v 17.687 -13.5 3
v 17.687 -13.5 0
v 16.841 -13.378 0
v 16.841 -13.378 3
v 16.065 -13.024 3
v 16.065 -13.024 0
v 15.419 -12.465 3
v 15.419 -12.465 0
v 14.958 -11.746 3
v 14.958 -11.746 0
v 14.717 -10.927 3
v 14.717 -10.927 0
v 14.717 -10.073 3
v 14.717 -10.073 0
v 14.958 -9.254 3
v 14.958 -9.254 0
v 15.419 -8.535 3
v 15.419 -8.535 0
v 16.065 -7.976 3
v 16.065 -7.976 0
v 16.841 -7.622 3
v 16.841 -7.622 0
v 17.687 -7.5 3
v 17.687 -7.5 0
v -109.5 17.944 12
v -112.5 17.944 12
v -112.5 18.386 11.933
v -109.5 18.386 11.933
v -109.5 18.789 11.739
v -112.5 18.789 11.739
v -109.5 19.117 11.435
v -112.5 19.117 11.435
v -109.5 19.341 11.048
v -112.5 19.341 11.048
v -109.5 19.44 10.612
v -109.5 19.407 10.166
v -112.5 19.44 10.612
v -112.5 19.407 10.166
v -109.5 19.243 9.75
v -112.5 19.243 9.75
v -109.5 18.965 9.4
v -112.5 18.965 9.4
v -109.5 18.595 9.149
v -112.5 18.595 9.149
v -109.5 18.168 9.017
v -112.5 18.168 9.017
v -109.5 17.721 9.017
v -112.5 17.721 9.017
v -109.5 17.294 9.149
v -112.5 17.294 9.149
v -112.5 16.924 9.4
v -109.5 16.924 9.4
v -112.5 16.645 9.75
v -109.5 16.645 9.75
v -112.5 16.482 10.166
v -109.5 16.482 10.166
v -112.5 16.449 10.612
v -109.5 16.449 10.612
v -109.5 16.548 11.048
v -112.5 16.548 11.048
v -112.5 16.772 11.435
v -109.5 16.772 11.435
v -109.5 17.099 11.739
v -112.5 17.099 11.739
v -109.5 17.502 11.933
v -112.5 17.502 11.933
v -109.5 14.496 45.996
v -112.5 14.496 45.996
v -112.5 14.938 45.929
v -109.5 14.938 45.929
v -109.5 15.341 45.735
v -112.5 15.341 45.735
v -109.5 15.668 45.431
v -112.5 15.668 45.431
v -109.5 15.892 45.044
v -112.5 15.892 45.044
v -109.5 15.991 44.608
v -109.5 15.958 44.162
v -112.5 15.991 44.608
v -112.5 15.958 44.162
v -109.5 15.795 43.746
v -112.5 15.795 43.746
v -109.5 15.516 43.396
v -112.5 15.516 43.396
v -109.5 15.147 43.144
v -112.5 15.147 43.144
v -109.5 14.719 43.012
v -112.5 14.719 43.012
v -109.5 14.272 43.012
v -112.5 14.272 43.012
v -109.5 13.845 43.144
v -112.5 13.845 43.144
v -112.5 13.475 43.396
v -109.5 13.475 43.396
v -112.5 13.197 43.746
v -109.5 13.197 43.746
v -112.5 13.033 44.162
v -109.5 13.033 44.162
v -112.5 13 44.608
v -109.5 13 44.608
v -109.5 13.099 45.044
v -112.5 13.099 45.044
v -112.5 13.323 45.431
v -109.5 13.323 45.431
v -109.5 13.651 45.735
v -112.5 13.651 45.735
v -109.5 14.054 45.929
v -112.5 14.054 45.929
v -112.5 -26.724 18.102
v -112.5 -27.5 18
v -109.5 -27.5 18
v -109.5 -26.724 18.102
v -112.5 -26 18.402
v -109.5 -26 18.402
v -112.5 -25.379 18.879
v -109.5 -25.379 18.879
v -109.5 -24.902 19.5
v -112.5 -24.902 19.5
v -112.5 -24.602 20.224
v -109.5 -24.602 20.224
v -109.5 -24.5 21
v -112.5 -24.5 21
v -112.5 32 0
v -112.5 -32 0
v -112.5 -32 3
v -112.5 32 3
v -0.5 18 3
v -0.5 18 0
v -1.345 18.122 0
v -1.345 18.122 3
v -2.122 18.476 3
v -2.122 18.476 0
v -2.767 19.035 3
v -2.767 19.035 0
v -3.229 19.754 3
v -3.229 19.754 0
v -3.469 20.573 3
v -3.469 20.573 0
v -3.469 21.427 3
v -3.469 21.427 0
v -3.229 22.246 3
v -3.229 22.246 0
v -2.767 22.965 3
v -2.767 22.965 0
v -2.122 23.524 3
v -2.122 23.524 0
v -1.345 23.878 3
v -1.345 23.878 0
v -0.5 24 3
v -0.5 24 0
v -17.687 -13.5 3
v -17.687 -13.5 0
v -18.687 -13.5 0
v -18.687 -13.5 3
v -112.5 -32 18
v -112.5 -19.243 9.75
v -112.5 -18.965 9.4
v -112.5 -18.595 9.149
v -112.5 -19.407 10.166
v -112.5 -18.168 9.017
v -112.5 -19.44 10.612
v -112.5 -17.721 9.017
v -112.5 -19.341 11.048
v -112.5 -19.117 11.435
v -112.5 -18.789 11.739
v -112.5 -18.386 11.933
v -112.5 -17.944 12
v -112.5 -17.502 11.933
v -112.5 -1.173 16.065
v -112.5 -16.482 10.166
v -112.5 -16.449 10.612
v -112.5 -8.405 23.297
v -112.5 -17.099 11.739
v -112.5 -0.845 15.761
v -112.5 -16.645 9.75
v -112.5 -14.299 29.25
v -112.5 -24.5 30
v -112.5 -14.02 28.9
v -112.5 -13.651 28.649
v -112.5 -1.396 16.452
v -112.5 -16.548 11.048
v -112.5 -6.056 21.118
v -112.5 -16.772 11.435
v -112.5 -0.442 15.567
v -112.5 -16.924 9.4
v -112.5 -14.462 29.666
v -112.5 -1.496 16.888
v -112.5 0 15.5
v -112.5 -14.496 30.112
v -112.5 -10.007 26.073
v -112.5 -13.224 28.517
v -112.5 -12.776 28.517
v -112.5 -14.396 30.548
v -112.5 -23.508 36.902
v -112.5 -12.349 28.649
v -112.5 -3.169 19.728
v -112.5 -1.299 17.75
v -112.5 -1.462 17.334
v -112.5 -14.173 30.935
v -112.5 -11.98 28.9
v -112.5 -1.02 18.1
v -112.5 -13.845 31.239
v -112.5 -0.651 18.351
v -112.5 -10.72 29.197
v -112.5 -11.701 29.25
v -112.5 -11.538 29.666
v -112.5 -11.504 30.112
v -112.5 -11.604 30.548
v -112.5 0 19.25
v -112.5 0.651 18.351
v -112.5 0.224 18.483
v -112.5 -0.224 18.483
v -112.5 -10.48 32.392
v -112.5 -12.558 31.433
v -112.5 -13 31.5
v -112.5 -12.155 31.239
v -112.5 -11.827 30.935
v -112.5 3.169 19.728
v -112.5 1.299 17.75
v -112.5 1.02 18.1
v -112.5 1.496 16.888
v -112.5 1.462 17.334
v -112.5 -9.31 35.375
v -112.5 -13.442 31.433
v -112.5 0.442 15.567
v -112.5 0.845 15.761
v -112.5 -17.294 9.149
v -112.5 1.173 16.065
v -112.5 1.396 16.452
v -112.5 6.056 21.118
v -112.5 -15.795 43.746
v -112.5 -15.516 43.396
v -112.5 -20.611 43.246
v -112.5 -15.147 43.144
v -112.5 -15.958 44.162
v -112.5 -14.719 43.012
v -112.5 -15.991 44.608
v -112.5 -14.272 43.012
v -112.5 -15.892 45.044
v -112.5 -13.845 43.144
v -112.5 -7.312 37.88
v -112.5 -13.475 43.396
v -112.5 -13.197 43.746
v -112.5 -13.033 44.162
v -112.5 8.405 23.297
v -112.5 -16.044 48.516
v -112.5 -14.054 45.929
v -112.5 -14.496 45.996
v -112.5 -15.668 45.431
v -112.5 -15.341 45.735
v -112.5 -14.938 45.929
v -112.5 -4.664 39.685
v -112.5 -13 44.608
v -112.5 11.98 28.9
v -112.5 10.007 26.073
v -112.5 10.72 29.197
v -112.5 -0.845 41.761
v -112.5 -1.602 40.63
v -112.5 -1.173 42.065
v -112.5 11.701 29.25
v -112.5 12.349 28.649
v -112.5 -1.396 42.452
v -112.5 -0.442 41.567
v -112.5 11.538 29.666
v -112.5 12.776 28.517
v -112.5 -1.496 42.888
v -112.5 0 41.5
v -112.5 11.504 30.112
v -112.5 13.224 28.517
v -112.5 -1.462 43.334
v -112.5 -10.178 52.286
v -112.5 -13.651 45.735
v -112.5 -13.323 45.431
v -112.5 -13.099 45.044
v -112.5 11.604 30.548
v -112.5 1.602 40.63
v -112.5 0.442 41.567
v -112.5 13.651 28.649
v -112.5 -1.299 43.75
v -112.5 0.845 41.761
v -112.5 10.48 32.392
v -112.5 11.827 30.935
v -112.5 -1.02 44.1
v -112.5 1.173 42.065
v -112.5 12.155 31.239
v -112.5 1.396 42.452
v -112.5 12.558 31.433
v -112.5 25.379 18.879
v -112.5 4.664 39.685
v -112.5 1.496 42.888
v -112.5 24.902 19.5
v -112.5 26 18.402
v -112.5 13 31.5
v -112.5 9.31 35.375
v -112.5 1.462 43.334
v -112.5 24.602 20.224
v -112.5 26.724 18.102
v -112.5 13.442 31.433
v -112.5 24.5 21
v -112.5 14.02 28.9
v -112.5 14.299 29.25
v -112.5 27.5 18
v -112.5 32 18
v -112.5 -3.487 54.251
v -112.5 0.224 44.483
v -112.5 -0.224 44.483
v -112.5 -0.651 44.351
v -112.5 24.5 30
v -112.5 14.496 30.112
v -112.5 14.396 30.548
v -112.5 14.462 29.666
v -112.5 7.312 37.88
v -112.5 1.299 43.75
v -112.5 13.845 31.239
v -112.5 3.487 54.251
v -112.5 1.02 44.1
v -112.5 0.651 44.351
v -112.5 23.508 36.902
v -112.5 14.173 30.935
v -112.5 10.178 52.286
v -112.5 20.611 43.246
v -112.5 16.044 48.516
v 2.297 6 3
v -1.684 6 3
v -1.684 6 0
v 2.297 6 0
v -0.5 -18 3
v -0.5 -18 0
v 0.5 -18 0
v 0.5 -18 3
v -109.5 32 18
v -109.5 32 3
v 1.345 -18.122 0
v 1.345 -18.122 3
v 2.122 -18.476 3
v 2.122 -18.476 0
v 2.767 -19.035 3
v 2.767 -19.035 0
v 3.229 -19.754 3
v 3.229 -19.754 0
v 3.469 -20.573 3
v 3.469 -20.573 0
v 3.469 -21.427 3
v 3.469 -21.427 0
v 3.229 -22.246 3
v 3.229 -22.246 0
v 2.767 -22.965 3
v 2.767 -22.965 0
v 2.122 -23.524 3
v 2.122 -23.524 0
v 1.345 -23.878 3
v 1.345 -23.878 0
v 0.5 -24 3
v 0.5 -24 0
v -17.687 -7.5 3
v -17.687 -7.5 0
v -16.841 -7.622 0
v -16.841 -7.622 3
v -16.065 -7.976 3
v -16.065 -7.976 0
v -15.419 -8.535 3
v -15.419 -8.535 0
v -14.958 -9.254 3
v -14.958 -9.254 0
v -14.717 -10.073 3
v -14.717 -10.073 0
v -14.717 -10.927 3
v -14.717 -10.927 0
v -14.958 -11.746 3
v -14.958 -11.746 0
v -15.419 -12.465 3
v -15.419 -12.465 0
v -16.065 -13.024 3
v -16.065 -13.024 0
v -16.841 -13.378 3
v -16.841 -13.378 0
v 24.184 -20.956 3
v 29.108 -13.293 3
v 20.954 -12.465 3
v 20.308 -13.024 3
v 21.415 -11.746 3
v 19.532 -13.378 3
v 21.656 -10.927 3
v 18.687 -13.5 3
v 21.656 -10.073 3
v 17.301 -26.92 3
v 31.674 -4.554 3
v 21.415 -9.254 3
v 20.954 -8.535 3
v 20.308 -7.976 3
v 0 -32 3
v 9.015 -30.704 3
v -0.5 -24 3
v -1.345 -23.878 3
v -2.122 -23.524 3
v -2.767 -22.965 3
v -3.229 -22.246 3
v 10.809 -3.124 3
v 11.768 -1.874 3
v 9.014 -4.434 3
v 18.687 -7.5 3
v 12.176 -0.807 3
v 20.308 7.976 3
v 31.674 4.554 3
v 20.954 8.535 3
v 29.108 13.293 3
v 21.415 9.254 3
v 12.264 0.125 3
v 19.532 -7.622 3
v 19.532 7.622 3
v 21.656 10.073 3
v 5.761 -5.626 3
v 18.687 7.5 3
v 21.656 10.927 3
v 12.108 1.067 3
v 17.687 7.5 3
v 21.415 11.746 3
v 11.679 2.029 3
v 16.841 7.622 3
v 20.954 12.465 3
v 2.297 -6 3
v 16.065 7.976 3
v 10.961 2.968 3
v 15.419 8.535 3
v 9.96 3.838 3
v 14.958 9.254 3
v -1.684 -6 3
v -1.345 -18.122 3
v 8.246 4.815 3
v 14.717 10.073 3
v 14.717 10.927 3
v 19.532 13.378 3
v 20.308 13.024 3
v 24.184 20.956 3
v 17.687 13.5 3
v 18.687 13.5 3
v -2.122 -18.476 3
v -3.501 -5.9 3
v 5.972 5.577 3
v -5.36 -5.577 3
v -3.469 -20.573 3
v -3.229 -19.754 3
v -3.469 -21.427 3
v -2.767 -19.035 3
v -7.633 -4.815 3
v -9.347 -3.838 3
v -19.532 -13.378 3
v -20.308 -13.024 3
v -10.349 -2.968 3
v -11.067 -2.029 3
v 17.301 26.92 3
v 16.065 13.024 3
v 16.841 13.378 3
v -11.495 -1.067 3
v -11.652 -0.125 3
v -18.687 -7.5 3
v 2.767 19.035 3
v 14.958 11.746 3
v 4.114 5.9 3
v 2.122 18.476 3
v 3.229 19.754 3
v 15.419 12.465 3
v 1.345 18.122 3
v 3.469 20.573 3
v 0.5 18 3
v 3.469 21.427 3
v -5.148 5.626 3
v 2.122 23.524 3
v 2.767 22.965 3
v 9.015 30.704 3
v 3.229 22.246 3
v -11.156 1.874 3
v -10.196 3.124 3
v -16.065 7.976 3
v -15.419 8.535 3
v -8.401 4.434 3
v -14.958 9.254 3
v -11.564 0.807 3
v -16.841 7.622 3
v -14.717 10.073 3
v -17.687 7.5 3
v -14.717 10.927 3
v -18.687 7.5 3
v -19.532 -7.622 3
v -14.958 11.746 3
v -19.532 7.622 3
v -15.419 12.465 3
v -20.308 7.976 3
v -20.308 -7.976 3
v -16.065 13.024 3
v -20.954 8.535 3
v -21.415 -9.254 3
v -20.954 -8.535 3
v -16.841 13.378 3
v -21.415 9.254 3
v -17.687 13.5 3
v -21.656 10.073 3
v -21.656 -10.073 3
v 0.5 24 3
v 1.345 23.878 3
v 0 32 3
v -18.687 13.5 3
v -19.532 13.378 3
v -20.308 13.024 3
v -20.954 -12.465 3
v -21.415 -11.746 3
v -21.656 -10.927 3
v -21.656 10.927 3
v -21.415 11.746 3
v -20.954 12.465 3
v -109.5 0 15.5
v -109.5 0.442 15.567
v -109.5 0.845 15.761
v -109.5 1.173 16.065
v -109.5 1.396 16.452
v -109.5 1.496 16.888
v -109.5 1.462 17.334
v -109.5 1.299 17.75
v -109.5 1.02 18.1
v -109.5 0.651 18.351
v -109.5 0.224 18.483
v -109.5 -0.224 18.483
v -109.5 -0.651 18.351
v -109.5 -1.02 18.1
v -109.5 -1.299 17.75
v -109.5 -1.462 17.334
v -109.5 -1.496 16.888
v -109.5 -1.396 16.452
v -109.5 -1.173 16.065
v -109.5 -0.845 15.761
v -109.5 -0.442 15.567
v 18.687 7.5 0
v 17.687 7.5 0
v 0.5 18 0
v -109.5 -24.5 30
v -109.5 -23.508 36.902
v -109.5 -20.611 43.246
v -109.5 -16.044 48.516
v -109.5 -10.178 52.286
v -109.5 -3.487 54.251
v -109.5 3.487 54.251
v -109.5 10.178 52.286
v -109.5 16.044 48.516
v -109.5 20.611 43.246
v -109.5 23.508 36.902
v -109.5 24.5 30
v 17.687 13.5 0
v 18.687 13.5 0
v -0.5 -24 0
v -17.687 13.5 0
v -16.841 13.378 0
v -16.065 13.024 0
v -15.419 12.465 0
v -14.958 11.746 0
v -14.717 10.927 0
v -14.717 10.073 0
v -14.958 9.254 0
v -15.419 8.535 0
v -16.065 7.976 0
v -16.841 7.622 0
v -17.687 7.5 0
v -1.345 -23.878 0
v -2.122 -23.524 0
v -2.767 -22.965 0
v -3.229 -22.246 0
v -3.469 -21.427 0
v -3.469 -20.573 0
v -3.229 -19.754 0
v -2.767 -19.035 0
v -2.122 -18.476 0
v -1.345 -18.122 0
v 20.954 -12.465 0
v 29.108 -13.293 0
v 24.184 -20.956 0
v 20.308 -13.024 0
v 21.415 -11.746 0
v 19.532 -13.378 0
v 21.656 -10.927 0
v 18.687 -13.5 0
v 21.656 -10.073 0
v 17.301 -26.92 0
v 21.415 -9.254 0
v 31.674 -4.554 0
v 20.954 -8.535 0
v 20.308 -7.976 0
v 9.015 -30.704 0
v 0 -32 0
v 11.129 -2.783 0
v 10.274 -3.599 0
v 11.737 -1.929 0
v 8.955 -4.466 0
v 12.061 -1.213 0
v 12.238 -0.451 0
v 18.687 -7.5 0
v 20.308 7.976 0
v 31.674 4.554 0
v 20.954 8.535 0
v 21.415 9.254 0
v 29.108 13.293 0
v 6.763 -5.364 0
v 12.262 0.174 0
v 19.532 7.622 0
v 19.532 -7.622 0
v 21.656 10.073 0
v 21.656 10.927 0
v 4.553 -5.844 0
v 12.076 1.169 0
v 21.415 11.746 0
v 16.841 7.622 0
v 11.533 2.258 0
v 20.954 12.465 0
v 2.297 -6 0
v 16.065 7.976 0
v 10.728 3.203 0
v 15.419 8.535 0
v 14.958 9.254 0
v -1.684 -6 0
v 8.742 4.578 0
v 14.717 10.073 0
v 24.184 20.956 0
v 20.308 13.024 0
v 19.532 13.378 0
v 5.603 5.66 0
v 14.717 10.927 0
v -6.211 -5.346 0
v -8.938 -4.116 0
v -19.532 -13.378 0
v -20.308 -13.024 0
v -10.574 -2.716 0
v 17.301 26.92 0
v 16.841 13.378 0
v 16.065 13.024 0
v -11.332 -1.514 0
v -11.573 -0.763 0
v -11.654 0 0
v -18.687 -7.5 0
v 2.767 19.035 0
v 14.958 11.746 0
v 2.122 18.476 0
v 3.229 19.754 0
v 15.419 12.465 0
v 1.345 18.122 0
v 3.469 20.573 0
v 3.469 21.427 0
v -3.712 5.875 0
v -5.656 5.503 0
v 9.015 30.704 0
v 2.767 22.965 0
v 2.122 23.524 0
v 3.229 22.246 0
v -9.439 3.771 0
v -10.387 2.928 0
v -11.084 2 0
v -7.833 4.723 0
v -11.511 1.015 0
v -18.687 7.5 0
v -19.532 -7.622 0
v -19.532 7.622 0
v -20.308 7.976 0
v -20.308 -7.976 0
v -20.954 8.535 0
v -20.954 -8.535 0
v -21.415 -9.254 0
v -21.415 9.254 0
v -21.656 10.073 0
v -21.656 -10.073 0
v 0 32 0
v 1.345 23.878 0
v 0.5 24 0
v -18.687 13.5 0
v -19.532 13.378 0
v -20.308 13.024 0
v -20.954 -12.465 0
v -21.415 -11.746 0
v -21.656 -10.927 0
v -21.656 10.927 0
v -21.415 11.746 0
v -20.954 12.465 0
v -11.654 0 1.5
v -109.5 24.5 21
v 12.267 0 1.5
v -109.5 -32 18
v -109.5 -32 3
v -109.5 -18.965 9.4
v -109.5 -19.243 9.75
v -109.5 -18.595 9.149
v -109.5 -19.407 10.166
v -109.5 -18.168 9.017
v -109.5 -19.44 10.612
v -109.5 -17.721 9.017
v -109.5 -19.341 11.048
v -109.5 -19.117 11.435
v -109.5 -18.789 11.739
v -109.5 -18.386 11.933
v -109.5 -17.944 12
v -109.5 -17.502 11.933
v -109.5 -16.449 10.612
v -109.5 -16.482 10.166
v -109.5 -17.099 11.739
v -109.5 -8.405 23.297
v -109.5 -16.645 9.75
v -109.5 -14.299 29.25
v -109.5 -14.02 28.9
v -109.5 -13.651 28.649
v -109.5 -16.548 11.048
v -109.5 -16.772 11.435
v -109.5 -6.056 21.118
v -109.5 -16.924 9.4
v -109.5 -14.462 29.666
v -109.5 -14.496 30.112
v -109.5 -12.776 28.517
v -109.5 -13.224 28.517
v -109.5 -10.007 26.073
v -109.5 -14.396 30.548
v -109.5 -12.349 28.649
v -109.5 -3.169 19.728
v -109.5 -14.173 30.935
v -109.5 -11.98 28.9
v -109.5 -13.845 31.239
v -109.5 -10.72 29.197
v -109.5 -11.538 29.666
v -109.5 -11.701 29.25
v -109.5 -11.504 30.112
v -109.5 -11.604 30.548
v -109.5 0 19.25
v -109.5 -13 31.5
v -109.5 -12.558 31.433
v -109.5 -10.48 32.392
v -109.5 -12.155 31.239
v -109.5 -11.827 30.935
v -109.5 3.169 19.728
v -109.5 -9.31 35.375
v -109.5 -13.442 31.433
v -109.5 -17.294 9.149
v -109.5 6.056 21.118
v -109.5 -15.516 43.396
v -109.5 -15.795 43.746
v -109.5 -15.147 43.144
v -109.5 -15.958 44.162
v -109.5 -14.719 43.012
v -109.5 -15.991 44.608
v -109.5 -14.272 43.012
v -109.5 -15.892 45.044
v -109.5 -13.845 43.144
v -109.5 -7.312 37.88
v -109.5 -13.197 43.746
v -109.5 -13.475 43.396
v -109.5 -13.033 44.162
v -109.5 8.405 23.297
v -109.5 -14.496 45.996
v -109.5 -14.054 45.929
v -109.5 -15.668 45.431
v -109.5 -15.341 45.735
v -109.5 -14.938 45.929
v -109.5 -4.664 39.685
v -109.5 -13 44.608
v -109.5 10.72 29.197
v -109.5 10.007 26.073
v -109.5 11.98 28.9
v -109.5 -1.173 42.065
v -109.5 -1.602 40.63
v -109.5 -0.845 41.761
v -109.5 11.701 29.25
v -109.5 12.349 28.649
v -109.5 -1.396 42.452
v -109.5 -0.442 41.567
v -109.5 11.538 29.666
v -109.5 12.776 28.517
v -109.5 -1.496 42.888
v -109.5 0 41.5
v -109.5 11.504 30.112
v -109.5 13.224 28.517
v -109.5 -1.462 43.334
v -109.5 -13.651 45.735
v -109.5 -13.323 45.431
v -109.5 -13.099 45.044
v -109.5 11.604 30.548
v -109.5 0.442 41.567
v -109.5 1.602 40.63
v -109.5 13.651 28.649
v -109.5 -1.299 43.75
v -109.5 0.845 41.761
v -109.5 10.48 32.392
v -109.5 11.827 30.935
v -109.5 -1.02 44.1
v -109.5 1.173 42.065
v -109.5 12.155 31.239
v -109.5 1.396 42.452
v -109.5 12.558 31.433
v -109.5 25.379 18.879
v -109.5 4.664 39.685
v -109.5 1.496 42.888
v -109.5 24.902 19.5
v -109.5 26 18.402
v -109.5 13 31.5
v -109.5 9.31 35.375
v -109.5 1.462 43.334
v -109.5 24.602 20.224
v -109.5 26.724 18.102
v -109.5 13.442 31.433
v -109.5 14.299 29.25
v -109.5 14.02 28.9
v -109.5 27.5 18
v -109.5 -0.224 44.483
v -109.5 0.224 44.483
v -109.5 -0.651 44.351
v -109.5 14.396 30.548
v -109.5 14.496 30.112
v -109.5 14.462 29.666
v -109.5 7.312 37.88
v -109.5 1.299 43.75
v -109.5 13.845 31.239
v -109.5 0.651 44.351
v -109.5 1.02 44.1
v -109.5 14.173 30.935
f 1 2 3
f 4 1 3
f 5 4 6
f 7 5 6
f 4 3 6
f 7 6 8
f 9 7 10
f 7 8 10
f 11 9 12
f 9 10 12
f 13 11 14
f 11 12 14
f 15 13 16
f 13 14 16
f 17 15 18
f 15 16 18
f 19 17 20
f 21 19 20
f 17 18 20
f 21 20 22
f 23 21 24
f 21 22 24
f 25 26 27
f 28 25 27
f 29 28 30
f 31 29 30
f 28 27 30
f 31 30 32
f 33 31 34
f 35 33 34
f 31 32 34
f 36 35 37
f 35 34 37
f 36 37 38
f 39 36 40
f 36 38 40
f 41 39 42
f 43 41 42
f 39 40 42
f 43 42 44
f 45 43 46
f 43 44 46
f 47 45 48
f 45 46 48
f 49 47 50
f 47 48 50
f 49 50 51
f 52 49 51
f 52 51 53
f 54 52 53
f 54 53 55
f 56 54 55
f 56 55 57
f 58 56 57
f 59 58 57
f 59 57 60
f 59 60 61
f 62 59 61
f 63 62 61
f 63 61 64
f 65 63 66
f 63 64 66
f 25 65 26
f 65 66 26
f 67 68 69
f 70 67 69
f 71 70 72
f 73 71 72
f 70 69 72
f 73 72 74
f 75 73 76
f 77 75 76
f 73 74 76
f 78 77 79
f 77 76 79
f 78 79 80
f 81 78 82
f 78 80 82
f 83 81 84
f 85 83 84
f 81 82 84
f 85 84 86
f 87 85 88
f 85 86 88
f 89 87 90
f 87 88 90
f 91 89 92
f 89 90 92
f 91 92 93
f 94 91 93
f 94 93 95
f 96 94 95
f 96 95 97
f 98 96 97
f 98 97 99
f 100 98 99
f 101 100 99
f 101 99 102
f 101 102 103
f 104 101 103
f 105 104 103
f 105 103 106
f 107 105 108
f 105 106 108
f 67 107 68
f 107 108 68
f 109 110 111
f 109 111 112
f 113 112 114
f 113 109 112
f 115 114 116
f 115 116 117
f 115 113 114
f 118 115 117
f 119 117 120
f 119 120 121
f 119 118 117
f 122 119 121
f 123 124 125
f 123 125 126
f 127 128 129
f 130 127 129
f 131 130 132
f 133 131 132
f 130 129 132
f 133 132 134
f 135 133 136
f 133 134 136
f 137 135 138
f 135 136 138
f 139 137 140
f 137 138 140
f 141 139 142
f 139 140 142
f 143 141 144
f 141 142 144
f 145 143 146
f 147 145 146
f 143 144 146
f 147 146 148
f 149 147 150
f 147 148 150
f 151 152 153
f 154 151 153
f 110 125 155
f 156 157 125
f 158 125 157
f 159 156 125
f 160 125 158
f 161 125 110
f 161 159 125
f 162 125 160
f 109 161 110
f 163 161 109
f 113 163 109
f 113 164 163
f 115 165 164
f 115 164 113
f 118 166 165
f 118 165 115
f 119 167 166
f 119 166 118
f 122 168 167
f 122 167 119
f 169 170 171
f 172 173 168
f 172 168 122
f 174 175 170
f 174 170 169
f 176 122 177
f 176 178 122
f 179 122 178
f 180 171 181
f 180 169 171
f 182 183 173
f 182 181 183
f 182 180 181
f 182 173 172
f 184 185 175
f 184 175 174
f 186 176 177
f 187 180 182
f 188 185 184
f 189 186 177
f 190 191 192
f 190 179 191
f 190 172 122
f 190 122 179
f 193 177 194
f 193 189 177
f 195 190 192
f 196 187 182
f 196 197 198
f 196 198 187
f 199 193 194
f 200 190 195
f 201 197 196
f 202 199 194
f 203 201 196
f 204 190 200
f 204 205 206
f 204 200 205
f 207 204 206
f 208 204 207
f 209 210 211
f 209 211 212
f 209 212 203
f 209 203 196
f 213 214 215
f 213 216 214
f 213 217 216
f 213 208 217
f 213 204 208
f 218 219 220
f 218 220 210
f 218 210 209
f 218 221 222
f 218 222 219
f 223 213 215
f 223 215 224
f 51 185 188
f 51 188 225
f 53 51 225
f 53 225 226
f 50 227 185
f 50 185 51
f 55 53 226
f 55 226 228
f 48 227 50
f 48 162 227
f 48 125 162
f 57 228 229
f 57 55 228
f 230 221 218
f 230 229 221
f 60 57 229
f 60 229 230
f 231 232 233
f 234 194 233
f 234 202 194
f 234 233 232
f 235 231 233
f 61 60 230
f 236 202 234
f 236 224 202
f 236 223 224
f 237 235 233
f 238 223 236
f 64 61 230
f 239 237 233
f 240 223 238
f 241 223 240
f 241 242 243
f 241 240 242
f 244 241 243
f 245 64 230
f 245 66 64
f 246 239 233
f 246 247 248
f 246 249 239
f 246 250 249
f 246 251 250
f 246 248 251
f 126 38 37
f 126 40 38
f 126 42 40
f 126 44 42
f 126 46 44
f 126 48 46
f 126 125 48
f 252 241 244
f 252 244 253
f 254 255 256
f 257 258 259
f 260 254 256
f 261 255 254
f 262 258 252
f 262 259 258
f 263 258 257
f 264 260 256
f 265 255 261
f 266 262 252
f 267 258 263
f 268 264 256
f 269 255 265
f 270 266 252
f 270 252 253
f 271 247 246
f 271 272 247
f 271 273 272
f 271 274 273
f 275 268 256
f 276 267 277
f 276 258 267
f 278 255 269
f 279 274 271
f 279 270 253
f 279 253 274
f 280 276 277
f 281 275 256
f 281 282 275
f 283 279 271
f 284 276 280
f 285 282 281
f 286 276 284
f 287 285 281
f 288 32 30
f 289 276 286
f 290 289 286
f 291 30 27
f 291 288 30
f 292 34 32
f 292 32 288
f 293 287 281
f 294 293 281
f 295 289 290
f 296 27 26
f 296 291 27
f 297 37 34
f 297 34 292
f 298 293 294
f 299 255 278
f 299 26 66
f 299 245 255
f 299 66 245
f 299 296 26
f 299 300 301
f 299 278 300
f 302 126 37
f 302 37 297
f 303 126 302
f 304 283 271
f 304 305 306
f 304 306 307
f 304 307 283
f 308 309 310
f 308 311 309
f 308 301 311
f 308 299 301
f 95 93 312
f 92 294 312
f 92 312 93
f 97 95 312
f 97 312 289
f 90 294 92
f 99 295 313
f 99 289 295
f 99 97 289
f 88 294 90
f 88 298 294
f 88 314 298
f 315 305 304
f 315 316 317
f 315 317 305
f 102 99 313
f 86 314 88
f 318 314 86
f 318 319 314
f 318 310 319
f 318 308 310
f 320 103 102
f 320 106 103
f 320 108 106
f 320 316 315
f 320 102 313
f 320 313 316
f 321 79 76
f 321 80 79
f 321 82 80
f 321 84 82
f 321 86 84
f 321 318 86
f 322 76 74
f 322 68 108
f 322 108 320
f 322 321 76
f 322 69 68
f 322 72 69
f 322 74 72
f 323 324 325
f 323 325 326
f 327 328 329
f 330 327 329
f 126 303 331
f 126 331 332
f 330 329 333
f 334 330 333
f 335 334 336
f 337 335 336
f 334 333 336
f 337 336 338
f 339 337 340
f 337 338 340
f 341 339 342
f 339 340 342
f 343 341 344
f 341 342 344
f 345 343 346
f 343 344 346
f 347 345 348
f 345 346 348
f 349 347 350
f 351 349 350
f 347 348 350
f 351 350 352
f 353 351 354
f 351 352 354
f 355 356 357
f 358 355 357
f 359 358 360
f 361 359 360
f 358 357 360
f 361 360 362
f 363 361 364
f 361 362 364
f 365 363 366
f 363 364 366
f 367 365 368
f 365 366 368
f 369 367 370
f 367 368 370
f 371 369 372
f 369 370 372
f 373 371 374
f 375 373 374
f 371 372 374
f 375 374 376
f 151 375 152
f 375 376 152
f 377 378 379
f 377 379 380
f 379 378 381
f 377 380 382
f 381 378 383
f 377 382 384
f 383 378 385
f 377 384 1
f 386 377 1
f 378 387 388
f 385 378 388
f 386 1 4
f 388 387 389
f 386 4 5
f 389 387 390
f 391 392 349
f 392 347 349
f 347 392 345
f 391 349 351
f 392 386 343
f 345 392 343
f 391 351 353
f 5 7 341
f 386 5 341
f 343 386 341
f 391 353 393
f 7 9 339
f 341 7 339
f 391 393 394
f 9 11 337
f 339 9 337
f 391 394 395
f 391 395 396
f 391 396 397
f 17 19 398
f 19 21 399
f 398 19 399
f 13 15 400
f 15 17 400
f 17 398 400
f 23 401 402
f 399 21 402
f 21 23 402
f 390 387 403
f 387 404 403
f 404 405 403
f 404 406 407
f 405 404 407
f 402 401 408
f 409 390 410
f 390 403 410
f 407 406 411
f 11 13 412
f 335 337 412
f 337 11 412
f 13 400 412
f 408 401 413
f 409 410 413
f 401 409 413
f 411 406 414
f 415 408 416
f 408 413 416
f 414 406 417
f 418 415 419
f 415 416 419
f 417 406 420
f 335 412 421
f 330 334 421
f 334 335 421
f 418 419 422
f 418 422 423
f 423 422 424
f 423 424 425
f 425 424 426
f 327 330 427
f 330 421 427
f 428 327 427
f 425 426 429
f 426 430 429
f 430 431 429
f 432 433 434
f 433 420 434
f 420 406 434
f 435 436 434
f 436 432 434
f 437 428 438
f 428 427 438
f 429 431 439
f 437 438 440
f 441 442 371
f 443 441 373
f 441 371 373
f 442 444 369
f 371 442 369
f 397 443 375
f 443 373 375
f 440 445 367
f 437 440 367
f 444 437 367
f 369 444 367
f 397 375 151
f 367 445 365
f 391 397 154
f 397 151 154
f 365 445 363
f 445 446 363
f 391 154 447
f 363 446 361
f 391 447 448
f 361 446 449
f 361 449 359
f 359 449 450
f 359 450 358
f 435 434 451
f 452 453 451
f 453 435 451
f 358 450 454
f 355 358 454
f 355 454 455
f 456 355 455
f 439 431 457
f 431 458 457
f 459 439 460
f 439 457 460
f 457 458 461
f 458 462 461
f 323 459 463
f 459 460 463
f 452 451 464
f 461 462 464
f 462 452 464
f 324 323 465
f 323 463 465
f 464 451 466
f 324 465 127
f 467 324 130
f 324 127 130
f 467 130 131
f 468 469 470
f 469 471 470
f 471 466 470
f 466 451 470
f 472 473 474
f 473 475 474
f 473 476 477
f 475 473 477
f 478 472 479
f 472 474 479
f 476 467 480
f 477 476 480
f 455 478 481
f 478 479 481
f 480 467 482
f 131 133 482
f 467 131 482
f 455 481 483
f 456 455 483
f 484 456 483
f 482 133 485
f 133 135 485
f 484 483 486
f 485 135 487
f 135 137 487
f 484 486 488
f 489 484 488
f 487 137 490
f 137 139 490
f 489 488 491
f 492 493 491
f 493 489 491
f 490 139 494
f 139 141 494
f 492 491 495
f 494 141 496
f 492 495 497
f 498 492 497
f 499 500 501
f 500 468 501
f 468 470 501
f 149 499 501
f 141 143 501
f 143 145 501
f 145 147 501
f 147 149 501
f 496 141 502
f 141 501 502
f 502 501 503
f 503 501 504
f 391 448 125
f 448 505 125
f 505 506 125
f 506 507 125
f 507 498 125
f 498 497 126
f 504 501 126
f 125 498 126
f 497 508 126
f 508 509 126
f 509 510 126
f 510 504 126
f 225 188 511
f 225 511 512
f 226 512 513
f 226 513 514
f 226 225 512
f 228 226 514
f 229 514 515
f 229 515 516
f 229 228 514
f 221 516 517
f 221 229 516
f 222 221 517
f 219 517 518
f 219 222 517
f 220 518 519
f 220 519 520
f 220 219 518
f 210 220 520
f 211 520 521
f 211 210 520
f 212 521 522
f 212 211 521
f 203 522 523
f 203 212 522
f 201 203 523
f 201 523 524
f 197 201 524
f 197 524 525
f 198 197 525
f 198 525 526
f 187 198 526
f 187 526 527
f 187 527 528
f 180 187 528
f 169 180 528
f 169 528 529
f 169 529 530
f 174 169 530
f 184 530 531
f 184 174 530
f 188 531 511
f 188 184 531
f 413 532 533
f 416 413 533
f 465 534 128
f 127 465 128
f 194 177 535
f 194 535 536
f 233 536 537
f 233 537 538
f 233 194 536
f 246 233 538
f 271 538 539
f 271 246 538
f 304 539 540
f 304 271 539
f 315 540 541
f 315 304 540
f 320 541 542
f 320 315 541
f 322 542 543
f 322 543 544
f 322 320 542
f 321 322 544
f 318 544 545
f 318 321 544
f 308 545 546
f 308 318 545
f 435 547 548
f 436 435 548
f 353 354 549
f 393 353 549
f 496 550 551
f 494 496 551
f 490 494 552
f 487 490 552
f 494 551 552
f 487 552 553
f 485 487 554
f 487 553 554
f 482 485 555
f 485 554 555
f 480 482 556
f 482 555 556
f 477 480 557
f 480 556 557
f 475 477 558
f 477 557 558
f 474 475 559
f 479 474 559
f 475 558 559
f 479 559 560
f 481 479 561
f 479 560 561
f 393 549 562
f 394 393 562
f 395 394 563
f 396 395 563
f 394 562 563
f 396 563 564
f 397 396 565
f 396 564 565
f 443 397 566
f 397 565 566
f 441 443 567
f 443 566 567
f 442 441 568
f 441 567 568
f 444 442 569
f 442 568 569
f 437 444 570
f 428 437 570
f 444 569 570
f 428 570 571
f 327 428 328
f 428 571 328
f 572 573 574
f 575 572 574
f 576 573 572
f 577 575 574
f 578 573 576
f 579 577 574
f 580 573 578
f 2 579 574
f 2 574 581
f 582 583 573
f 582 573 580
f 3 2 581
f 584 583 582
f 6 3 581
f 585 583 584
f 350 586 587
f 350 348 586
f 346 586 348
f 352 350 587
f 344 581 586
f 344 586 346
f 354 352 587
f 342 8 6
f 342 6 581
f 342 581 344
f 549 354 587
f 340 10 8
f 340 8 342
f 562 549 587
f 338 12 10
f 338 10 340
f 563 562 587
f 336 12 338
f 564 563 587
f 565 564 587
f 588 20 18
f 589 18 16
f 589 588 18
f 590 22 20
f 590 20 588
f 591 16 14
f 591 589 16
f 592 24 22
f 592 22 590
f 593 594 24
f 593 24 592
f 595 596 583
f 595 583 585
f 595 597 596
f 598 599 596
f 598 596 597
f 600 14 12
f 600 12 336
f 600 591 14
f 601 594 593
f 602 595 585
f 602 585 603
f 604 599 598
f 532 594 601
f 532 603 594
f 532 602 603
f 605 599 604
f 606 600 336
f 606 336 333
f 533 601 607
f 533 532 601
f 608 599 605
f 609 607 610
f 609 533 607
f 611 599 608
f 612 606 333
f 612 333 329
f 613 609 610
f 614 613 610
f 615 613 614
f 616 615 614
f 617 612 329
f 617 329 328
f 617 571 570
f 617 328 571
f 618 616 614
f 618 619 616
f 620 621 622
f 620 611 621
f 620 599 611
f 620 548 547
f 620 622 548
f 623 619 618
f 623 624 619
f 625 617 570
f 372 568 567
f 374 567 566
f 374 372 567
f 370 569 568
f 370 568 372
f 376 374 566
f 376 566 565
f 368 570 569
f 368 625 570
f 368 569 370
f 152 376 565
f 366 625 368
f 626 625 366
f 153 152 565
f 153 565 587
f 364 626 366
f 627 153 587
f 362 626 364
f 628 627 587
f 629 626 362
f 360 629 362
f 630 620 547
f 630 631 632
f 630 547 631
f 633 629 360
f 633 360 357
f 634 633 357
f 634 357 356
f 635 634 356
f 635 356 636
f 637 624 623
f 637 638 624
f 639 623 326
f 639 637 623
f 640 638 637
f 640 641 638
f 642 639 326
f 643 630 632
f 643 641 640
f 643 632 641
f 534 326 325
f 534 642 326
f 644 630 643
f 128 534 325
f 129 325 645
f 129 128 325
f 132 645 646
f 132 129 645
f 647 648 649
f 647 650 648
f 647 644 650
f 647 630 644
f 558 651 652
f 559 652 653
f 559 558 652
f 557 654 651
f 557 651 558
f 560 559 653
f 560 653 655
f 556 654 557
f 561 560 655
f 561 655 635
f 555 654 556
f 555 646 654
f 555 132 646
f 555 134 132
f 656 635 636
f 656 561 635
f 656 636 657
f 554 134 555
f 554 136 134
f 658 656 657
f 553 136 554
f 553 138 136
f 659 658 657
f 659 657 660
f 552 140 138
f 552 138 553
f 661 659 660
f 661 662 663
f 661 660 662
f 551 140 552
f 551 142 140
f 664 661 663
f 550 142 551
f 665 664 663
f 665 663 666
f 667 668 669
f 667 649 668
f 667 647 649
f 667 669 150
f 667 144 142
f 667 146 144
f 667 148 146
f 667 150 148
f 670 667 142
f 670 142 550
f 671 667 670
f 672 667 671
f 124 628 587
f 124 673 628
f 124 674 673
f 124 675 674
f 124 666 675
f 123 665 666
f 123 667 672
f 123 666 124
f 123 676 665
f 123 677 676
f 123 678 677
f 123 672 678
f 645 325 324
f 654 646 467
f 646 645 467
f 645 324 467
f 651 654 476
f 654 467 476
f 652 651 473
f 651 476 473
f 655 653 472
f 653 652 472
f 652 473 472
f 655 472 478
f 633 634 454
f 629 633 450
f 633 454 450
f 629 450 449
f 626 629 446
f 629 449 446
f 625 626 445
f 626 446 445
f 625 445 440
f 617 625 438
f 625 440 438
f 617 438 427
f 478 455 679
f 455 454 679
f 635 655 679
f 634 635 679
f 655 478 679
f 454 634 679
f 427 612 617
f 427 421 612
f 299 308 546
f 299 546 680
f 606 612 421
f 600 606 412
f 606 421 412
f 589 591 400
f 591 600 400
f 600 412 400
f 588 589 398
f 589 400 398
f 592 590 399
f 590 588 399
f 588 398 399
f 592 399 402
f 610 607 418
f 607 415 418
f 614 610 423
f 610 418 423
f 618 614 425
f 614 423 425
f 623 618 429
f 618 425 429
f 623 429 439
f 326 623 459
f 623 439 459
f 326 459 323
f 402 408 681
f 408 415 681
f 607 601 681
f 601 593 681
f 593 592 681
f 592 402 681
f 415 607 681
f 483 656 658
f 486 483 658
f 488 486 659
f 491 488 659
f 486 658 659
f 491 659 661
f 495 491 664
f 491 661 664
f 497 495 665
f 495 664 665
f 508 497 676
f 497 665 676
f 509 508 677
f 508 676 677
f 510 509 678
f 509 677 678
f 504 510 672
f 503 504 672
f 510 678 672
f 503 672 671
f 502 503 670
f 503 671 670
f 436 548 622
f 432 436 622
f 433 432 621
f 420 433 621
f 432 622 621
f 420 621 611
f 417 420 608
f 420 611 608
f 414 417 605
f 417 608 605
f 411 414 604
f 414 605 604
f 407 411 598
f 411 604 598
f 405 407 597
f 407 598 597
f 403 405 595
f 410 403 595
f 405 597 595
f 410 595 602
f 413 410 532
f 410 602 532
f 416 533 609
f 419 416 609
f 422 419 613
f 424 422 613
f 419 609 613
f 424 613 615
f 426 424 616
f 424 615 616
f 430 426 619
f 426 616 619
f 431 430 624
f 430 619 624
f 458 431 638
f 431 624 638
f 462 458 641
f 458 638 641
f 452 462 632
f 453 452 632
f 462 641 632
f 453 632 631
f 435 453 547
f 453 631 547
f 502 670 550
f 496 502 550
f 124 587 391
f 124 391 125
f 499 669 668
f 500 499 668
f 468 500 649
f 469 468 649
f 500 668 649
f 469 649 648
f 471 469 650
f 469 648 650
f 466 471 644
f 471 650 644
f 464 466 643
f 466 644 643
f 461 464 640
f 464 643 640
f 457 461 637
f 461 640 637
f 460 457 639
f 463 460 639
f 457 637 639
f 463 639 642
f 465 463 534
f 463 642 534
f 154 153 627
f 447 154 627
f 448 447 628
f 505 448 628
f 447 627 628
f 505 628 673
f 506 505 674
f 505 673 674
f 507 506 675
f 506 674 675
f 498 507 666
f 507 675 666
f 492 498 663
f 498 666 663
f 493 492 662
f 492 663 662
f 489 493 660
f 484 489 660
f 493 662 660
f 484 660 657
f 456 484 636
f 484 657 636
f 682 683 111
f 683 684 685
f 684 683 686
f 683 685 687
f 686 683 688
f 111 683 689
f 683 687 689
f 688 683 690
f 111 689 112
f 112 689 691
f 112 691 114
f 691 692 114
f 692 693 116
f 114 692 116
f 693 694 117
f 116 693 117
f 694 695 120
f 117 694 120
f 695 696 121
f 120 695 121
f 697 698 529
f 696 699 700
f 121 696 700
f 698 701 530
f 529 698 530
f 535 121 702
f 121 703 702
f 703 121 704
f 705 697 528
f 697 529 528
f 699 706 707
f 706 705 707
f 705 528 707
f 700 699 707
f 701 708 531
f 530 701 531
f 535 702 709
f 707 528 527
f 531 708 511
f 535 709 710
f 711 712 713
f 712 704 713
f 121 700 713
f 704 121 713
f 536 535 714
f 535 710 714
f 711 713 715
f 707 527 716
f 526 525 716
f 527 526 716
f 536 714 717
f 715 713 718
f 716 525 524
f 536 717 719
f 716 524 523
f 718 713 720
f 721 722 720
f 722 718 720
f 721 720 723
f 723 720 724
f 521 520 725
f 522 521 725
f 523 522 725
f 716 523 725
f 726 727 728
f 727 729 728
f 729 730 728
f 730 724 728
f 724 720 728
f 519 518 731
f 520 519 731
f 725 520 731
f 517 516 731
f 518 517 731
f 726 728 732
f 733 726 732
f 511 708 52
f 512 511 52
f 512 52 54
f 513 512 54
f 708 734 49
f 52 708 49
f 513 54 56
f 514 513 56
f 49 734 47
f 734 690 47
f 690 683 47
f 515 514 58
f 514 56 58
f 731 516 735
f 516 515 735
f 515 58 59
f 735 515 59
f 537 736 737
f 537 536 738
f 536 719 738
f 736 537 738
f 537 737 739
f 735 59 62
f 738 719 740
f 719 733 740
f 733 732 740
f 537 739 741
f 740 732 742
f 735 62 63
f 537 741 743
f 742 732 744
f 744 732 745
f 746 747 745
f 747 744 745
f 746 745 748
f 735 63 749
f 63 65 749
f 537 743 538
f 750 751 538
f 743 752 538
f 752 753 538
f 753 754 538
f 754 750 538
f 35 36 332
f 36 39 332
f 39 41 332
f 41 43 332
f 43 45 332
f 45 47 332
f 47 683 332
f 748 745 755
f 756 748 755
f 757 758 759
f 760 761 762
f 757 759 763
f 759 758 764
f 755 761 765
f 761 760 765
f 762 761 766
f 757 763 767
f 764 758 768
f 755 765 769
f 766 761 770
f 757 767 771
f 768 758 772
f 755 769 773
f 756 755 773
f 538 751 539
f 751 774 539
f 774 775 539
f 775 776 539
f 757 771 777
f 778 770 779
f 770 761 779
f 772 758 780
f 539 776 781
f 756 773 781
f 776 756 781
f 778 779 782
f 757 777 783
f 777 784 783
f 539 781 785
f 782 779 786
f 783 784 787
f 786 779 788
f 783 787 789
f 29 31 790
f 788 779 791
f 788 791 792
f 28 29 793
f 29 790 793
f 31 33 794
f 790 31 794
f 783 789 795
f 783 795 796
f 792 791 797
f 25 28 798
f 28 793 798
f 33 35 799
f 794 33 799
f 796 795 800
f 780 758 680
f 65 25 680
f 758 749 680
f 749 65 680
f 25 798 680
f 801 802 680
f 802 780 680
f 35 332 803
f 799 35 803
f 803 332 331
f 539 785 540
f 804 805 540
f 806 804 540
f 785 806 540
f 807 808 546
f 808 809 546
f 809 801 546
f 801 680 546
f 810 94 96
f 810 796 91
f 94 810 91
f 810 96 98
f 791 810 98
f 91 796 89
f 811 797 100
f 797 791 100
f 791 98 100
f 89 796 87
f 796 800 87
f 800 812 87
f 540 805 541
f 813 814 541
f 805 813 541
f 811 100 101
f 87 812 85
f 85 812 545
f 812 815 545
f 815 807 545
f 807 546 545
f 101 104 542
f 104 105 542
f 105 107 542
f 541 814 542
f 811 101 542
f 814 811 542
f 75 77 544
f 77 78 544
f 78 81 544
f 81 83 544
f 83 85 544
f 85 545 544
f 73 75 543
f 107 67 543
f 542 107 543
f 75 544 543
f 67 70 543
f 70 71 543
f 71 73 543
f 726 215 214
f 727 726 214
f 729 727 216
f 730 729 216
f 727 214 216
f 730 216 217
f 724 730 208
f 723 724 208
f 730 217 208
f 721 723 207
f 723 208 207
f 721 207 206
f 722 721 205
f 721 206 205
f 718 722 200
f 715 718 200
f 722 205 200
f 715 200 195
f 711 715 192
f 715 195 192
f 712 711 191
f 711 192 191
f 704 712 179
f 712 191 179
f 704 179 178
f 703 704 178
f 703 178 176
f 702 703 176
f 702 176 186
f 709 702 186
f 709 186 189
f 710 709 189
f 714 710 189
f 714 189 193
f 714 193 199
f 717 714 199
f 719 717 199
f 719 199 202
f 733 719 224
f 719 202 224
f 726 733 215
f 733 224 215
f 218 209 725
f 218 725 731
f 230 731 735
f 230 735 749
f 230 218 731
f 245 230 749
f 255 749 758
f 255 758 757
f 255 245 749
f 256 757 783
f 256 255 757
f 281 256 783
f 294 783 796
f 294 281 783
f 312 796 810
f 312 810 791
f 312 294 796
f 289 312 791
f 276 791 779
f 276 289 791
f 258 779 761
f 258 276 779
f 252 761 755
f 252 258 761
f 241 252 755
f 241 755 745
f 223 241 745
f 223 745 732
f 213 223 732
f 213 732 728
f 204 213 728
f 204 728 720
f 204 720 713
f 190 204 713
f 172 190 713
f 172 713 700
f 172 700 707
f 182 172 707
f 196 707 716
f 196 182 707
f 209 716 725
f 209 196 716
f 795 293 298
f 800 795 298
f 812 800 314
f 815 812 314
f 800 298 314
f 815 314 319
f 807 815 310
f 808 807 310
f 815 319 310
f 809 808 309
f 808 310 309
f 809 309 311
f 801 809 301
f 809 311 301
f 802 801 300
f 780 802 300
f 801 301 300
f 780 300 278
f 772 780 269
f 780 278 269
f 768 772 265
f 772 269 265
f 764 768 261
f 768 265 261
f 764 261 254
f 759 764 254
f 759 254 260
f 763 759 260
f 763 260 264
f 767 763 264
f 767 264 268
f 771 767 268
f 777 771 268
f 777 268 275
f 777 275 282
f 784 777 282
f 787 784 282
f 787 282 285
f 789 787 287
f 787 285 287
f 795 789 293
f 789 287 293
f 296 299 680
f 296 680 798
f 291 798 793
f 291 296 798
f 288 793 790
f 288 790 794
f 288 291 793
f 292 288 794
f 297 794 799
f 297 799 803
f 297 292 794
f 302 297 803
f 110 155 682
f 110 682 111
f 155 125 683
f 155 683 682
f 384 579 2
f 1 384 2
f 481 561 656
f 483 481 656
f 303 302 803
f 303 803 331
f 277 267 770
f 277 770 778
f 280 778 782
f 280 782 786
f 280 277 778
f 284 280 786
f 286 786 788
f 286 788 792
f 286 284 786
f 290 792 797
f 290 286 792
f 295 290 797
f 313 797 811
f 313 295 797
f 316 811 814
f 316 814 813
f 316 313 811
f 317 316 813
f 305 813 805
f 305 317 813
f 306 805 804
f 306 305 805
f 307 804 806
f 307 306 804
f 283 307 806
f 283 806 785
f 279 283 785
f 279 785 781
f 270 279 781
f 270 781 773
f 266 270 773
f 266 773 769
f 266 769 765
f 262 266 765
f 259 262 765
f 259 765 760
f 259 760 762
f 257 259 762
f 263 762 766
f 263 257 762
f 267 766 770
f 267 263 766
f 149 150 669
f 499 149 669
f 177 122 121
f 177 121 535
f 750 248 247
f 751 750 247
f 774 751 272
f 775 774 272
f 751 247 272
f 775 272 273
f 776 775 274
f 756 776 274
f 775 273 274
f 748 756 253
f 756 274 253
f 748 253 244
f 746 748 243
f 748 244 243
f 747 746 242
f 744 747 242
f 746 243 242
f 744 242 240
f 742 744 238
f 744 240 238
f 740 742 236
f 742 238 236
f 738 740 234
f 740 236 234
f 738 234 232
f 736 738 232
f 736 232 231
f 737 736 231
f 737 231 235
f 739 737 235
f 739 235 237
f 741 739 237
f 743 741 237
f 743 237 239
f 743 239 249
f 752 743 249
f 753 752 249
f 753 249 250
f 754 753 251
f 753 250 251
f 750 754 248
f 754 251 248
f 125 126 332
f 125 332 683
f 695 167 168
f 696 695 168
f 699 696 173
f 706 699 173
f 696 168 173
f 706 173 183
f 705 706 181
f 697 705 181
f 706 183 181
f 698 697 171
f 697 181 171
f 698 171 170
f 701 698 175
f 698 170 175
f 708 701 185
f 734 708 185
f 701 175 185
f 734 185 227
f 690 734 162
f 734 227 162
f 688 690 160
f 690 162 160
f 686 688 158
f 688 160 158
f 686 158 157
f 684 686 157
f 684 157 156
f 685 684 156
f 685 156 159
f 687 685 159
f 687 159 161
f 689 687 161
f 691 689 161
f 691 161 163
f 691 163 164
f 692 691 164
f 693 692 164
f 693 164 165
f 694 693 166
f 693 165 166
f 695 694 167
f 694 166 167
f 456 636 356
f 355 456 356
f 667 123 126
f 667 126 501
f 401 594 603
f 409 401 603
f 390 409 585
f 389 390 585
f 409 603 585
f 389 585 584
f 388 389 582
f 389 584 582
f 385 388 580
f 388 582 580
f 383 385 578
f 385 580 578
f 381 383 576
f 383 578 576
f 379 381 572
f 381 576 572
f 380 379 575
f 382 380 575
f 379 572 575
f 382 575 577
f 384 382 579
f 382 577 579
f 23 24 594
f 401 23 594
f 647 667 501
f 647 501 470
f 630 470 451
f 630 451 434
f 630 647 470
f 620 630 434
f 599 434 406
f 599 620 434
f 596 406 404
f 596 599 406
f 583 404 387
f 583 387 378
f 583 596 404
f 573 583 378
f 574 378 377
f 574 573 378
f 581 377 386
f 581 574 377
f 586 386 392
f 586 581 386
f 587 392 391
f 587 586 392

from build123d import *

# Parameters (mm, degrees)
BOSS_EXTRUDE1_DEPTH = 3
SKETCH2_R           = 1.5
BOSS_EXTRUDE2_DEPTH = 3
SKETCH3_R           = 6
CUT_EXTRUDE1_DEPTH  = 150.495916109
CUT_EXTRUDE2_DEPTH  = 128.79866979


with BuildPart() as part:
    # Sketch1 → Boss-Extrude1 (new body)
    with BuildSketch(Plane.XY):
        with BuildLine():
            Line((-112.5, 32), (0, 32))
            ThreePointArc((0, 32), (32, 0), (0, -32))
            Line((0, -32), (-112.5, -32))
            Line((-112.5, -32), (-112.5, 32))
        make_face()
        with BuildLine():
            Line((17.686533479, 13.5), (18.686533479, 13.5))
            ThreePointArc((18.686533479, 13.5), (21.686533479, 10.5), (18.686533479, 7.5))
            Line((18.686533479, 7.5), (17.686533479, 7.5))
            ThreePointArc((17.686533479, 7.5), (14.686533479, 10.5), (17.686533479, 13.5))
        make_face(mode=Mode.SUBTRACT)
        with BuildLine():
            Line((17.686533479, -7.5), (18.686533479, -7.5))
            ThreePointArc((18.686533479, -7.5), (21.686533479, -10.5), (18.686533479, -13.5))
            Line((18.686533479, -13.5), (17.686533479, -13.5))
            ThreePointArc((17.686533479, -13.5), (14.686533479, -10.5), (17.686533479, -7.5))
        make_face(mode=Mode.SUBTRACT)
        with BuildLine():
            Line((-0.5, -18), (0.5, -18))
            ThreePointArc((0.5, -18), (3.5, -21), (0.5, -24))
            Line((0.5, -24), (-0.5, -24))
            ThreePointArc((-0.5, -24), (-3.5, -21), (-0.5, -18))
        make_face(mode=Mode.SUBTRACT)
        with BuildLine():
            Line((-18.686533479, -7.5), (-17.686533479, -7.5))
            ThreePointArc((-17.686533479, -7.5), (-14.686533479, -10.5), (-17.686533479, -13.5))
            Line((-17.686533479, -13.5), (-18.686533479, -13.5))
            ThreePointArc((-18.686533479, -13.5), (-21.686533479, -10.5), (-18.686533479, -7.5))
        make_face(mode=Mode.SUBTRACT)
        with BuildLine():
            Line((-17.686533479, 7.5), (-18.686533479, 7.5))
            ThreePointArc((-18.686533479, 7.5), (-21.686533479, 10.5), (-18.686533479, 13.5))
            Line((-18.686533479, 13.5), (-17.686533479, 13.5))
            ThreePointArc((-17.686533479, 13.5), (-14.686533479, 10.5), (-17.686533479, 7.5))
        make_face(mode=Mode.SUBTRACT)
        with BuildLine():
            Line((0.5, 18), (-0.5, 18))
            ThreePointArc((-0.5, 18), (-3.5, 21), (-0.5, 24))
            Line((-0.5, 24), (0.5, 24))
            ThreePointArc((0.5, 24), (3.5, 21), (0.5, 18))
        make_face(mode=Mode.SUBTRACT)
    extrude(amount=BOSS_EXTRUDE1_DEPTH)

    # Sketch3 → Cut-Extrude1 (cut, through all)
    with BuildSketch(Plane(origin=(-68.399252687, 0, -51.542533886), x_dir=(0, 1, 0), z_dir=(0.798635510047294, 0, 0.6018150231520466))):
        with Locations(Location((0, 1.0136449, 0), (0, 0, 90))):
            Circle(SKETCH3_R)
    extrude(amount=CUT_EXTRUDE1_DEPTH, mode=Mode.SUBTRACT)

    # Sketch4 → Cut-Extrude2 (cut, through all)
    with BuildSketch(Plane.XY.offset(3)):
        with BuildLine():
            Line((2.296821411, -6), (-1.684313054, -6))
            add(Edge.make_bspline(
                [(-1.684313054, 6), (-11.654153901, 6), (-11.654153901, 0), (-11.654153901, -6), (-1.684313054, -6)],
                knots=[4.71238898, 4.71238898, 4.71238898, 6.283185307, 6.283185307, 7.853981634, 7.853981634, 7.853981634], degree=2, weights=[1, 0.707106781, 1, 0.707106781, 1]))
            Line((-1.684313054, 6), (2.296821411, 6))
            add(Edge.make_bspline(
                [(2.296821411, -6), (12.266662258, -6), (12.266662258, 0), (12.266662258, 6), (2.296821411, 6)],
                knots=[4.71238898, 4.71238898, 4.71238898, 6.283185307, 6.283185307, 7.853981634, 7.853981634, 7.853981634], degree=2, weights=[1, 0.707106781, 1, 0.707106781, 1]))
        make_face()
    extrude(amount=-CUT_EXTRUDE2_DEPTH, mode=Mode.SUBTRACT)


with BuildPart() as body_2:
    # Sketch2 → Boss-Extrude2 (new body)
    # profile 1 of 2: a face of its own
    with BuildSketch(Plane.ZY.offset(112.5)):
        with BuildLine():
            Line((3, 0), (3, -32))
            Line((3, -32), (18, -32))
            Line((18, -32), (18, -27.5))
            ThreePointArc((18, -27.5), (18.878679656, -25.378679656), (21, -24.5))
            Line((21, -24.5), (30, -24.5))
            ThreePointArc((30, -24.5), (54.5, 0), (30, 24.5))
            Line((30, 24.5), (21, 24.5))
            ThreePointArc((21, 24.5), (18.878679656, 25.378679656), (18, 27.5))
            Line((18, 27.5), (18, 32))
            Line((18, 32), (3, 32))
            Line((3, 32), (3, 0))
        make_face()
        with Locations((10.5, -17.944358445)):
            Circle(SKETCH2_R, mode=Mode.SUBTRACT)
        with BuildLine():
            ThreePointArc((18.5, 0), (17, -1.5), (15.5, 0))
            ThreePointArc((15.5, 0), (17, 1.5), (18.5, 0))
        make_face(mode=Mode.SUBTRACT)
        with Locations((30, -13)):
            Circle(SKETCH2_R, mode=Mode.SUBTRACT)
        with Locations((44.495689014, -14.495689014)):
            Circle(SKETCH2_R, mode=Mode.SUBTRACT)
        with Locations((10.5, 17.944358445)):
            Circle(SKETCH2_R, mode=Mode.SUBTRACT)
        with BuildLine():
            ThreePointArc((40.75, 0), (30, -10.75), (19.25, 0))
            ThreePointArc((19.25, 0), (30, 10.75), (40.75, 0))
        make_face(mode=Mode.SUBTRACT)
        with Locations((30, 13)):
            Circle(SKETCH2_R, mode=Mode.SUBTRACT)
        with BuildLine():
            ThreePointArc((44.5, 0), (43, -1.5), (41.5, 0))
            ThreePointArc((41.5, 0), (43, 1.5), (44.5, 0))
        make_face(mode=Mode.SUBTRACT)
        with Locations((44.495689014, 14.495689014)):
            Circle(SKETCH2_R, mode=Mode.SUBTRACT)
    # profile 2 of 2: a face of its own
    with BuildSketch(Plane.ZY.offset(112.5)):
        with BuildLine():
            Line((3, 0), (3, -32))
            Line((3, -32), (18, -32))
            Line((18, -32), (18, -27.5))
            ThreePointArc((18, -27.5), (18.878679656, -25.378679656), (21, -24.5))
            Line((21, -24.5), (30, -24.5))
            ThreePointArc((30, -24.5), (54.5, 0), (30, 24.5))
            Line((30, 24.5), (21, 24.5))
            ThreePointArc((21, 24.5), (18.878679656, 25.378679656), (18, 27.5))
            Line((18, 27.5), (18, 32))
            Line((18, 32), (3, 32))
            Line((3, 32), (3, 0))
        make_face()
        with Locations((10.5, -17.944358445)):
            Circle(SKETCH2_R, mode=Mode.SUBTRACT)
        with BuildLine():
            ThreePointArc((18.5, 0), (17, -1.5), (15.5, 0))
            ThreePointArc((15.5, 0), (17, 1.5), (18.5, 0))
        make_face(mode=Mode.SUBTRACT)
        with Locations((30, -13)):
            Circle(SKETCH2_R, mode=Mode.SUBTRACT)
        with Locations((44.495689014, -14.495689014)):
            Circle(SKETCH2_R, mode=Mode.SUBTRACT)
        with Locations((10.5, 17.944358445)):
            Circle(SKETCH2_R, mode=Mode.SUBTRACT)
        with BuildLine():
            ThreePointArc((40.75, 0), (30, -10.75), (19.25, 0))
            ThreePointArc((19.25, 0), (30, 10.75), (40.75, 0))
        make_face(mode=Mode.SUBTRACT)
        with Locations((30, 13)):
            Circle(SKETCH2_R, mode=Mode.SUBTRACT)
        with BuildLine():
            ThreePointArc((44.5, 0), (43, -1.5), (41.5, 0))
            ThreePointArc((41.5, 0), (43, 1.5), (44.5, 0))
        make_face(mode=Mode.SUBTRACT)
        with Locations((44.495689014, 14.495689014)):
            Circle(SKETCH2_R, mode=Mode.SUBTRACT)
    extrude(amount=-BOSS_EXTRUDE2_DEPTH)


solid = Compound([part.part, body_2.part])
